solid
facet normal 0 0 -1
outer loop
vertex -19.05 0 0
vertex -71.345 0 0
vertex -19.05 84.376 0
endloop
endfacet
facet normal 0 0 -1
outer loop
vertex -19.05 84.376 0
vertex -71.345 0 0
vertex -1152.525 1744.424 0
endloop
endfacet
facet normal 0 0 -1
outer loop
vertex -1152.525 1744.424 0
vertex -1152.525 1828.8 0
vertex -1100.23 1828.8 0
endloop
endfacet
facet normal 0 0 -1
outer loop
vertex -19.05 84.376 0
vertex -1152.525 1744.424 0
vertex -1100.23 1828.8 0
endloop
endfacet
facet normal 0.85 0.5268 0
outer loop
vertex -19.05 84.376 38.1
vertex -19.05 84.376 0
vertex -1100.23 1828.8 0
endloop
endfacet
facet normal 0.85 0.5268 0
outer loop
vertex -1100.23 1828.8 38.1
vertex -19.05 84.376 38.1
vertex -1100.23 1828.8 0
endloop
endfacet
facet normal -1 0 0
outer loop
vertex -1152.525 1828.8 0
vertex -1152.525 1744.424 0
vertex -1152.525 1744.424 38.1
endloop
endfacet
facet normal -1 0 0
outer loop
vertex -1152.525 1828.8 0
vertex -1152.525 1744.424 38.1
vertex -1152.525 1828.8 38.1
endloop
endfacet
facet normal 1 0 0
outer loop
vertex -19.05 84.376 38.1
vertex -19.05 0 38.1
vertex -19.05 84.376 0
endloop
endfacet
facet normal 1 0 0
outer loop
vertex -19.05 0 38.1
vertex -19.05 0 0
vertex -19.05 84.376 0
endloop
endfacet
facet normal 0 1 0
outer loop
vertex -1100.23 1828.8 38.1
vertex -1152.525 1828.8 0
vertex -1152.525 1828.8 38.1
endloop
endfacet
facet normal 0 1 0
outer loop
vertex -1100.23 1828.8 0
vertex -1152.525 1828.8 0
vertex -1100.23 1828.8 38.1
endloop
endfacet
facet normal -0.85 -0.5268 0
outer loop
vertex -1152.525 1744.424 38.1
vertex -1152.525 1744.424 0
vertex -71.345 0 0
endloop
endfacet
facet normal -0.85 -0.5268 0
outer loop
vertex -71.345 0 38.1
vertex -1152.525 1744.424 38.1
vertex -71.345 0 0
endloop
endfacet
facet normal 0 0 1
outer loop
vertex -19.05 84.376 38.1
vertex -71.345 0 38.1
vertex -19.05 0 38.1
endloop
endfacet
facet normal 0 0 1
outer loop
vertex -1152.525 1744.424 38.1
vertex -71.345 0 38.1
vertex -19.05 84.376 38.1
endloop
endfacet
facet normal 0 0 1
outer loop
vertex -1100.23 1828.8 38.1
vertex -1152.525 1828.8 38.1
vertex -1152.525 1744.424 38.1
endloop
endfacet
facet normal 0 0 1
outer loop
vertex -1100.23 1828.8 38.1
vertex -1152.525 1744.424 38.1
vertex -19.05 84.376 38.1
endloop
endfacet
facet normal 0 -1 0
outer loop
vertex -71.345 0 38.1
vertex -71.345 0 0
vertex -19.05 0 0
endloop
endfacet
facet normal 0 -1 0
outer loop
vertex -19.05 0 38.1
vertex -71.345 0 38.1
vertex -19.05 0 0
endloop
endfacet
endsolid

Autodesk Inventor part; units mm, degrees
ref_plane "YZ Plane" through (0, 0, 0) normal (1, 0, 0) x (0, 1, 0)
ref_plane "XZ Plane" through (0, 0, 0) normal (0, 1, 0) x (-1, 0, 0)
ref_plane "XY Plane" through (0, 0, 0) normal (0, 0, 1) x (1, 0, 0)
sketch "Sketch1" plane through (0, 0, 0) normal (0, 0, 1) x (1, 0, 0)
  line L0 (-1152.525, 0) -> (1152.525, 0)
  line L1 (-19.05, 0) -> (19.05, 0)
  line L2 (-19.05, 0) -> (-19.05, 1828.8)
  line L3 (19.05, 0) -> (19.05, 1828.8)
  line L4 (19.05, 1828.8) -> (-19.05, 1828.8)
  line L5 (1152.525, 0) -> (1152.525, 1828.8)
  line L6 (1152.525, 1828.8) -> (19.05, 1828.8)
  line L7 (-1152.525, 0) -> (-1152.525, 1828.8)
  line L8 (-1152.525, 1828.8) -> (-19.05, 1828.8)
  line L9 (-1152.525, 1828.8) -> (-19.05, 0)
  line L10 (19.05, 0) -> (1152.525, 1828.8)
  line L11 (-56.8317, -23.4168) -> (18.7317, 23.4168)
  line L12 (-1190.3067, 1805.3832) -> (-1114.7433, 1852.2168)
  line L13 (-1190.3067, 1805.3832) -> (-56.8317, -23.4168)
  line L14 (18.7317, 23.4168) -> (-1114.7433, 1852.2168)
  line L15 (0, 1828.8) -> (0, 0)
  point P0 (-19.05, 84.3755)
  point P1 (-1100.2298, 1828.8)
  point P2 (-1152.525, 1744.4245)
  point P3 (-71.3452, 0)
  dimension "d0" = 2305.05
  dimension "d1" = 38.1
  dimension "d2" = 1828.8
  dimension "d3" = 1828.8
  dimension "d4" = 1828.8
  dimension "d5" = 1828.8
  dimension "d6" = 88.9
  dimension "d7" = 88.9
extrude "Extrusion1" add sketch "Sketch1" along normal blind 38.1 contours L9 L8 L14 L2 | L0 L13 L7 L9
properties part number "S_2x4x84.708"
